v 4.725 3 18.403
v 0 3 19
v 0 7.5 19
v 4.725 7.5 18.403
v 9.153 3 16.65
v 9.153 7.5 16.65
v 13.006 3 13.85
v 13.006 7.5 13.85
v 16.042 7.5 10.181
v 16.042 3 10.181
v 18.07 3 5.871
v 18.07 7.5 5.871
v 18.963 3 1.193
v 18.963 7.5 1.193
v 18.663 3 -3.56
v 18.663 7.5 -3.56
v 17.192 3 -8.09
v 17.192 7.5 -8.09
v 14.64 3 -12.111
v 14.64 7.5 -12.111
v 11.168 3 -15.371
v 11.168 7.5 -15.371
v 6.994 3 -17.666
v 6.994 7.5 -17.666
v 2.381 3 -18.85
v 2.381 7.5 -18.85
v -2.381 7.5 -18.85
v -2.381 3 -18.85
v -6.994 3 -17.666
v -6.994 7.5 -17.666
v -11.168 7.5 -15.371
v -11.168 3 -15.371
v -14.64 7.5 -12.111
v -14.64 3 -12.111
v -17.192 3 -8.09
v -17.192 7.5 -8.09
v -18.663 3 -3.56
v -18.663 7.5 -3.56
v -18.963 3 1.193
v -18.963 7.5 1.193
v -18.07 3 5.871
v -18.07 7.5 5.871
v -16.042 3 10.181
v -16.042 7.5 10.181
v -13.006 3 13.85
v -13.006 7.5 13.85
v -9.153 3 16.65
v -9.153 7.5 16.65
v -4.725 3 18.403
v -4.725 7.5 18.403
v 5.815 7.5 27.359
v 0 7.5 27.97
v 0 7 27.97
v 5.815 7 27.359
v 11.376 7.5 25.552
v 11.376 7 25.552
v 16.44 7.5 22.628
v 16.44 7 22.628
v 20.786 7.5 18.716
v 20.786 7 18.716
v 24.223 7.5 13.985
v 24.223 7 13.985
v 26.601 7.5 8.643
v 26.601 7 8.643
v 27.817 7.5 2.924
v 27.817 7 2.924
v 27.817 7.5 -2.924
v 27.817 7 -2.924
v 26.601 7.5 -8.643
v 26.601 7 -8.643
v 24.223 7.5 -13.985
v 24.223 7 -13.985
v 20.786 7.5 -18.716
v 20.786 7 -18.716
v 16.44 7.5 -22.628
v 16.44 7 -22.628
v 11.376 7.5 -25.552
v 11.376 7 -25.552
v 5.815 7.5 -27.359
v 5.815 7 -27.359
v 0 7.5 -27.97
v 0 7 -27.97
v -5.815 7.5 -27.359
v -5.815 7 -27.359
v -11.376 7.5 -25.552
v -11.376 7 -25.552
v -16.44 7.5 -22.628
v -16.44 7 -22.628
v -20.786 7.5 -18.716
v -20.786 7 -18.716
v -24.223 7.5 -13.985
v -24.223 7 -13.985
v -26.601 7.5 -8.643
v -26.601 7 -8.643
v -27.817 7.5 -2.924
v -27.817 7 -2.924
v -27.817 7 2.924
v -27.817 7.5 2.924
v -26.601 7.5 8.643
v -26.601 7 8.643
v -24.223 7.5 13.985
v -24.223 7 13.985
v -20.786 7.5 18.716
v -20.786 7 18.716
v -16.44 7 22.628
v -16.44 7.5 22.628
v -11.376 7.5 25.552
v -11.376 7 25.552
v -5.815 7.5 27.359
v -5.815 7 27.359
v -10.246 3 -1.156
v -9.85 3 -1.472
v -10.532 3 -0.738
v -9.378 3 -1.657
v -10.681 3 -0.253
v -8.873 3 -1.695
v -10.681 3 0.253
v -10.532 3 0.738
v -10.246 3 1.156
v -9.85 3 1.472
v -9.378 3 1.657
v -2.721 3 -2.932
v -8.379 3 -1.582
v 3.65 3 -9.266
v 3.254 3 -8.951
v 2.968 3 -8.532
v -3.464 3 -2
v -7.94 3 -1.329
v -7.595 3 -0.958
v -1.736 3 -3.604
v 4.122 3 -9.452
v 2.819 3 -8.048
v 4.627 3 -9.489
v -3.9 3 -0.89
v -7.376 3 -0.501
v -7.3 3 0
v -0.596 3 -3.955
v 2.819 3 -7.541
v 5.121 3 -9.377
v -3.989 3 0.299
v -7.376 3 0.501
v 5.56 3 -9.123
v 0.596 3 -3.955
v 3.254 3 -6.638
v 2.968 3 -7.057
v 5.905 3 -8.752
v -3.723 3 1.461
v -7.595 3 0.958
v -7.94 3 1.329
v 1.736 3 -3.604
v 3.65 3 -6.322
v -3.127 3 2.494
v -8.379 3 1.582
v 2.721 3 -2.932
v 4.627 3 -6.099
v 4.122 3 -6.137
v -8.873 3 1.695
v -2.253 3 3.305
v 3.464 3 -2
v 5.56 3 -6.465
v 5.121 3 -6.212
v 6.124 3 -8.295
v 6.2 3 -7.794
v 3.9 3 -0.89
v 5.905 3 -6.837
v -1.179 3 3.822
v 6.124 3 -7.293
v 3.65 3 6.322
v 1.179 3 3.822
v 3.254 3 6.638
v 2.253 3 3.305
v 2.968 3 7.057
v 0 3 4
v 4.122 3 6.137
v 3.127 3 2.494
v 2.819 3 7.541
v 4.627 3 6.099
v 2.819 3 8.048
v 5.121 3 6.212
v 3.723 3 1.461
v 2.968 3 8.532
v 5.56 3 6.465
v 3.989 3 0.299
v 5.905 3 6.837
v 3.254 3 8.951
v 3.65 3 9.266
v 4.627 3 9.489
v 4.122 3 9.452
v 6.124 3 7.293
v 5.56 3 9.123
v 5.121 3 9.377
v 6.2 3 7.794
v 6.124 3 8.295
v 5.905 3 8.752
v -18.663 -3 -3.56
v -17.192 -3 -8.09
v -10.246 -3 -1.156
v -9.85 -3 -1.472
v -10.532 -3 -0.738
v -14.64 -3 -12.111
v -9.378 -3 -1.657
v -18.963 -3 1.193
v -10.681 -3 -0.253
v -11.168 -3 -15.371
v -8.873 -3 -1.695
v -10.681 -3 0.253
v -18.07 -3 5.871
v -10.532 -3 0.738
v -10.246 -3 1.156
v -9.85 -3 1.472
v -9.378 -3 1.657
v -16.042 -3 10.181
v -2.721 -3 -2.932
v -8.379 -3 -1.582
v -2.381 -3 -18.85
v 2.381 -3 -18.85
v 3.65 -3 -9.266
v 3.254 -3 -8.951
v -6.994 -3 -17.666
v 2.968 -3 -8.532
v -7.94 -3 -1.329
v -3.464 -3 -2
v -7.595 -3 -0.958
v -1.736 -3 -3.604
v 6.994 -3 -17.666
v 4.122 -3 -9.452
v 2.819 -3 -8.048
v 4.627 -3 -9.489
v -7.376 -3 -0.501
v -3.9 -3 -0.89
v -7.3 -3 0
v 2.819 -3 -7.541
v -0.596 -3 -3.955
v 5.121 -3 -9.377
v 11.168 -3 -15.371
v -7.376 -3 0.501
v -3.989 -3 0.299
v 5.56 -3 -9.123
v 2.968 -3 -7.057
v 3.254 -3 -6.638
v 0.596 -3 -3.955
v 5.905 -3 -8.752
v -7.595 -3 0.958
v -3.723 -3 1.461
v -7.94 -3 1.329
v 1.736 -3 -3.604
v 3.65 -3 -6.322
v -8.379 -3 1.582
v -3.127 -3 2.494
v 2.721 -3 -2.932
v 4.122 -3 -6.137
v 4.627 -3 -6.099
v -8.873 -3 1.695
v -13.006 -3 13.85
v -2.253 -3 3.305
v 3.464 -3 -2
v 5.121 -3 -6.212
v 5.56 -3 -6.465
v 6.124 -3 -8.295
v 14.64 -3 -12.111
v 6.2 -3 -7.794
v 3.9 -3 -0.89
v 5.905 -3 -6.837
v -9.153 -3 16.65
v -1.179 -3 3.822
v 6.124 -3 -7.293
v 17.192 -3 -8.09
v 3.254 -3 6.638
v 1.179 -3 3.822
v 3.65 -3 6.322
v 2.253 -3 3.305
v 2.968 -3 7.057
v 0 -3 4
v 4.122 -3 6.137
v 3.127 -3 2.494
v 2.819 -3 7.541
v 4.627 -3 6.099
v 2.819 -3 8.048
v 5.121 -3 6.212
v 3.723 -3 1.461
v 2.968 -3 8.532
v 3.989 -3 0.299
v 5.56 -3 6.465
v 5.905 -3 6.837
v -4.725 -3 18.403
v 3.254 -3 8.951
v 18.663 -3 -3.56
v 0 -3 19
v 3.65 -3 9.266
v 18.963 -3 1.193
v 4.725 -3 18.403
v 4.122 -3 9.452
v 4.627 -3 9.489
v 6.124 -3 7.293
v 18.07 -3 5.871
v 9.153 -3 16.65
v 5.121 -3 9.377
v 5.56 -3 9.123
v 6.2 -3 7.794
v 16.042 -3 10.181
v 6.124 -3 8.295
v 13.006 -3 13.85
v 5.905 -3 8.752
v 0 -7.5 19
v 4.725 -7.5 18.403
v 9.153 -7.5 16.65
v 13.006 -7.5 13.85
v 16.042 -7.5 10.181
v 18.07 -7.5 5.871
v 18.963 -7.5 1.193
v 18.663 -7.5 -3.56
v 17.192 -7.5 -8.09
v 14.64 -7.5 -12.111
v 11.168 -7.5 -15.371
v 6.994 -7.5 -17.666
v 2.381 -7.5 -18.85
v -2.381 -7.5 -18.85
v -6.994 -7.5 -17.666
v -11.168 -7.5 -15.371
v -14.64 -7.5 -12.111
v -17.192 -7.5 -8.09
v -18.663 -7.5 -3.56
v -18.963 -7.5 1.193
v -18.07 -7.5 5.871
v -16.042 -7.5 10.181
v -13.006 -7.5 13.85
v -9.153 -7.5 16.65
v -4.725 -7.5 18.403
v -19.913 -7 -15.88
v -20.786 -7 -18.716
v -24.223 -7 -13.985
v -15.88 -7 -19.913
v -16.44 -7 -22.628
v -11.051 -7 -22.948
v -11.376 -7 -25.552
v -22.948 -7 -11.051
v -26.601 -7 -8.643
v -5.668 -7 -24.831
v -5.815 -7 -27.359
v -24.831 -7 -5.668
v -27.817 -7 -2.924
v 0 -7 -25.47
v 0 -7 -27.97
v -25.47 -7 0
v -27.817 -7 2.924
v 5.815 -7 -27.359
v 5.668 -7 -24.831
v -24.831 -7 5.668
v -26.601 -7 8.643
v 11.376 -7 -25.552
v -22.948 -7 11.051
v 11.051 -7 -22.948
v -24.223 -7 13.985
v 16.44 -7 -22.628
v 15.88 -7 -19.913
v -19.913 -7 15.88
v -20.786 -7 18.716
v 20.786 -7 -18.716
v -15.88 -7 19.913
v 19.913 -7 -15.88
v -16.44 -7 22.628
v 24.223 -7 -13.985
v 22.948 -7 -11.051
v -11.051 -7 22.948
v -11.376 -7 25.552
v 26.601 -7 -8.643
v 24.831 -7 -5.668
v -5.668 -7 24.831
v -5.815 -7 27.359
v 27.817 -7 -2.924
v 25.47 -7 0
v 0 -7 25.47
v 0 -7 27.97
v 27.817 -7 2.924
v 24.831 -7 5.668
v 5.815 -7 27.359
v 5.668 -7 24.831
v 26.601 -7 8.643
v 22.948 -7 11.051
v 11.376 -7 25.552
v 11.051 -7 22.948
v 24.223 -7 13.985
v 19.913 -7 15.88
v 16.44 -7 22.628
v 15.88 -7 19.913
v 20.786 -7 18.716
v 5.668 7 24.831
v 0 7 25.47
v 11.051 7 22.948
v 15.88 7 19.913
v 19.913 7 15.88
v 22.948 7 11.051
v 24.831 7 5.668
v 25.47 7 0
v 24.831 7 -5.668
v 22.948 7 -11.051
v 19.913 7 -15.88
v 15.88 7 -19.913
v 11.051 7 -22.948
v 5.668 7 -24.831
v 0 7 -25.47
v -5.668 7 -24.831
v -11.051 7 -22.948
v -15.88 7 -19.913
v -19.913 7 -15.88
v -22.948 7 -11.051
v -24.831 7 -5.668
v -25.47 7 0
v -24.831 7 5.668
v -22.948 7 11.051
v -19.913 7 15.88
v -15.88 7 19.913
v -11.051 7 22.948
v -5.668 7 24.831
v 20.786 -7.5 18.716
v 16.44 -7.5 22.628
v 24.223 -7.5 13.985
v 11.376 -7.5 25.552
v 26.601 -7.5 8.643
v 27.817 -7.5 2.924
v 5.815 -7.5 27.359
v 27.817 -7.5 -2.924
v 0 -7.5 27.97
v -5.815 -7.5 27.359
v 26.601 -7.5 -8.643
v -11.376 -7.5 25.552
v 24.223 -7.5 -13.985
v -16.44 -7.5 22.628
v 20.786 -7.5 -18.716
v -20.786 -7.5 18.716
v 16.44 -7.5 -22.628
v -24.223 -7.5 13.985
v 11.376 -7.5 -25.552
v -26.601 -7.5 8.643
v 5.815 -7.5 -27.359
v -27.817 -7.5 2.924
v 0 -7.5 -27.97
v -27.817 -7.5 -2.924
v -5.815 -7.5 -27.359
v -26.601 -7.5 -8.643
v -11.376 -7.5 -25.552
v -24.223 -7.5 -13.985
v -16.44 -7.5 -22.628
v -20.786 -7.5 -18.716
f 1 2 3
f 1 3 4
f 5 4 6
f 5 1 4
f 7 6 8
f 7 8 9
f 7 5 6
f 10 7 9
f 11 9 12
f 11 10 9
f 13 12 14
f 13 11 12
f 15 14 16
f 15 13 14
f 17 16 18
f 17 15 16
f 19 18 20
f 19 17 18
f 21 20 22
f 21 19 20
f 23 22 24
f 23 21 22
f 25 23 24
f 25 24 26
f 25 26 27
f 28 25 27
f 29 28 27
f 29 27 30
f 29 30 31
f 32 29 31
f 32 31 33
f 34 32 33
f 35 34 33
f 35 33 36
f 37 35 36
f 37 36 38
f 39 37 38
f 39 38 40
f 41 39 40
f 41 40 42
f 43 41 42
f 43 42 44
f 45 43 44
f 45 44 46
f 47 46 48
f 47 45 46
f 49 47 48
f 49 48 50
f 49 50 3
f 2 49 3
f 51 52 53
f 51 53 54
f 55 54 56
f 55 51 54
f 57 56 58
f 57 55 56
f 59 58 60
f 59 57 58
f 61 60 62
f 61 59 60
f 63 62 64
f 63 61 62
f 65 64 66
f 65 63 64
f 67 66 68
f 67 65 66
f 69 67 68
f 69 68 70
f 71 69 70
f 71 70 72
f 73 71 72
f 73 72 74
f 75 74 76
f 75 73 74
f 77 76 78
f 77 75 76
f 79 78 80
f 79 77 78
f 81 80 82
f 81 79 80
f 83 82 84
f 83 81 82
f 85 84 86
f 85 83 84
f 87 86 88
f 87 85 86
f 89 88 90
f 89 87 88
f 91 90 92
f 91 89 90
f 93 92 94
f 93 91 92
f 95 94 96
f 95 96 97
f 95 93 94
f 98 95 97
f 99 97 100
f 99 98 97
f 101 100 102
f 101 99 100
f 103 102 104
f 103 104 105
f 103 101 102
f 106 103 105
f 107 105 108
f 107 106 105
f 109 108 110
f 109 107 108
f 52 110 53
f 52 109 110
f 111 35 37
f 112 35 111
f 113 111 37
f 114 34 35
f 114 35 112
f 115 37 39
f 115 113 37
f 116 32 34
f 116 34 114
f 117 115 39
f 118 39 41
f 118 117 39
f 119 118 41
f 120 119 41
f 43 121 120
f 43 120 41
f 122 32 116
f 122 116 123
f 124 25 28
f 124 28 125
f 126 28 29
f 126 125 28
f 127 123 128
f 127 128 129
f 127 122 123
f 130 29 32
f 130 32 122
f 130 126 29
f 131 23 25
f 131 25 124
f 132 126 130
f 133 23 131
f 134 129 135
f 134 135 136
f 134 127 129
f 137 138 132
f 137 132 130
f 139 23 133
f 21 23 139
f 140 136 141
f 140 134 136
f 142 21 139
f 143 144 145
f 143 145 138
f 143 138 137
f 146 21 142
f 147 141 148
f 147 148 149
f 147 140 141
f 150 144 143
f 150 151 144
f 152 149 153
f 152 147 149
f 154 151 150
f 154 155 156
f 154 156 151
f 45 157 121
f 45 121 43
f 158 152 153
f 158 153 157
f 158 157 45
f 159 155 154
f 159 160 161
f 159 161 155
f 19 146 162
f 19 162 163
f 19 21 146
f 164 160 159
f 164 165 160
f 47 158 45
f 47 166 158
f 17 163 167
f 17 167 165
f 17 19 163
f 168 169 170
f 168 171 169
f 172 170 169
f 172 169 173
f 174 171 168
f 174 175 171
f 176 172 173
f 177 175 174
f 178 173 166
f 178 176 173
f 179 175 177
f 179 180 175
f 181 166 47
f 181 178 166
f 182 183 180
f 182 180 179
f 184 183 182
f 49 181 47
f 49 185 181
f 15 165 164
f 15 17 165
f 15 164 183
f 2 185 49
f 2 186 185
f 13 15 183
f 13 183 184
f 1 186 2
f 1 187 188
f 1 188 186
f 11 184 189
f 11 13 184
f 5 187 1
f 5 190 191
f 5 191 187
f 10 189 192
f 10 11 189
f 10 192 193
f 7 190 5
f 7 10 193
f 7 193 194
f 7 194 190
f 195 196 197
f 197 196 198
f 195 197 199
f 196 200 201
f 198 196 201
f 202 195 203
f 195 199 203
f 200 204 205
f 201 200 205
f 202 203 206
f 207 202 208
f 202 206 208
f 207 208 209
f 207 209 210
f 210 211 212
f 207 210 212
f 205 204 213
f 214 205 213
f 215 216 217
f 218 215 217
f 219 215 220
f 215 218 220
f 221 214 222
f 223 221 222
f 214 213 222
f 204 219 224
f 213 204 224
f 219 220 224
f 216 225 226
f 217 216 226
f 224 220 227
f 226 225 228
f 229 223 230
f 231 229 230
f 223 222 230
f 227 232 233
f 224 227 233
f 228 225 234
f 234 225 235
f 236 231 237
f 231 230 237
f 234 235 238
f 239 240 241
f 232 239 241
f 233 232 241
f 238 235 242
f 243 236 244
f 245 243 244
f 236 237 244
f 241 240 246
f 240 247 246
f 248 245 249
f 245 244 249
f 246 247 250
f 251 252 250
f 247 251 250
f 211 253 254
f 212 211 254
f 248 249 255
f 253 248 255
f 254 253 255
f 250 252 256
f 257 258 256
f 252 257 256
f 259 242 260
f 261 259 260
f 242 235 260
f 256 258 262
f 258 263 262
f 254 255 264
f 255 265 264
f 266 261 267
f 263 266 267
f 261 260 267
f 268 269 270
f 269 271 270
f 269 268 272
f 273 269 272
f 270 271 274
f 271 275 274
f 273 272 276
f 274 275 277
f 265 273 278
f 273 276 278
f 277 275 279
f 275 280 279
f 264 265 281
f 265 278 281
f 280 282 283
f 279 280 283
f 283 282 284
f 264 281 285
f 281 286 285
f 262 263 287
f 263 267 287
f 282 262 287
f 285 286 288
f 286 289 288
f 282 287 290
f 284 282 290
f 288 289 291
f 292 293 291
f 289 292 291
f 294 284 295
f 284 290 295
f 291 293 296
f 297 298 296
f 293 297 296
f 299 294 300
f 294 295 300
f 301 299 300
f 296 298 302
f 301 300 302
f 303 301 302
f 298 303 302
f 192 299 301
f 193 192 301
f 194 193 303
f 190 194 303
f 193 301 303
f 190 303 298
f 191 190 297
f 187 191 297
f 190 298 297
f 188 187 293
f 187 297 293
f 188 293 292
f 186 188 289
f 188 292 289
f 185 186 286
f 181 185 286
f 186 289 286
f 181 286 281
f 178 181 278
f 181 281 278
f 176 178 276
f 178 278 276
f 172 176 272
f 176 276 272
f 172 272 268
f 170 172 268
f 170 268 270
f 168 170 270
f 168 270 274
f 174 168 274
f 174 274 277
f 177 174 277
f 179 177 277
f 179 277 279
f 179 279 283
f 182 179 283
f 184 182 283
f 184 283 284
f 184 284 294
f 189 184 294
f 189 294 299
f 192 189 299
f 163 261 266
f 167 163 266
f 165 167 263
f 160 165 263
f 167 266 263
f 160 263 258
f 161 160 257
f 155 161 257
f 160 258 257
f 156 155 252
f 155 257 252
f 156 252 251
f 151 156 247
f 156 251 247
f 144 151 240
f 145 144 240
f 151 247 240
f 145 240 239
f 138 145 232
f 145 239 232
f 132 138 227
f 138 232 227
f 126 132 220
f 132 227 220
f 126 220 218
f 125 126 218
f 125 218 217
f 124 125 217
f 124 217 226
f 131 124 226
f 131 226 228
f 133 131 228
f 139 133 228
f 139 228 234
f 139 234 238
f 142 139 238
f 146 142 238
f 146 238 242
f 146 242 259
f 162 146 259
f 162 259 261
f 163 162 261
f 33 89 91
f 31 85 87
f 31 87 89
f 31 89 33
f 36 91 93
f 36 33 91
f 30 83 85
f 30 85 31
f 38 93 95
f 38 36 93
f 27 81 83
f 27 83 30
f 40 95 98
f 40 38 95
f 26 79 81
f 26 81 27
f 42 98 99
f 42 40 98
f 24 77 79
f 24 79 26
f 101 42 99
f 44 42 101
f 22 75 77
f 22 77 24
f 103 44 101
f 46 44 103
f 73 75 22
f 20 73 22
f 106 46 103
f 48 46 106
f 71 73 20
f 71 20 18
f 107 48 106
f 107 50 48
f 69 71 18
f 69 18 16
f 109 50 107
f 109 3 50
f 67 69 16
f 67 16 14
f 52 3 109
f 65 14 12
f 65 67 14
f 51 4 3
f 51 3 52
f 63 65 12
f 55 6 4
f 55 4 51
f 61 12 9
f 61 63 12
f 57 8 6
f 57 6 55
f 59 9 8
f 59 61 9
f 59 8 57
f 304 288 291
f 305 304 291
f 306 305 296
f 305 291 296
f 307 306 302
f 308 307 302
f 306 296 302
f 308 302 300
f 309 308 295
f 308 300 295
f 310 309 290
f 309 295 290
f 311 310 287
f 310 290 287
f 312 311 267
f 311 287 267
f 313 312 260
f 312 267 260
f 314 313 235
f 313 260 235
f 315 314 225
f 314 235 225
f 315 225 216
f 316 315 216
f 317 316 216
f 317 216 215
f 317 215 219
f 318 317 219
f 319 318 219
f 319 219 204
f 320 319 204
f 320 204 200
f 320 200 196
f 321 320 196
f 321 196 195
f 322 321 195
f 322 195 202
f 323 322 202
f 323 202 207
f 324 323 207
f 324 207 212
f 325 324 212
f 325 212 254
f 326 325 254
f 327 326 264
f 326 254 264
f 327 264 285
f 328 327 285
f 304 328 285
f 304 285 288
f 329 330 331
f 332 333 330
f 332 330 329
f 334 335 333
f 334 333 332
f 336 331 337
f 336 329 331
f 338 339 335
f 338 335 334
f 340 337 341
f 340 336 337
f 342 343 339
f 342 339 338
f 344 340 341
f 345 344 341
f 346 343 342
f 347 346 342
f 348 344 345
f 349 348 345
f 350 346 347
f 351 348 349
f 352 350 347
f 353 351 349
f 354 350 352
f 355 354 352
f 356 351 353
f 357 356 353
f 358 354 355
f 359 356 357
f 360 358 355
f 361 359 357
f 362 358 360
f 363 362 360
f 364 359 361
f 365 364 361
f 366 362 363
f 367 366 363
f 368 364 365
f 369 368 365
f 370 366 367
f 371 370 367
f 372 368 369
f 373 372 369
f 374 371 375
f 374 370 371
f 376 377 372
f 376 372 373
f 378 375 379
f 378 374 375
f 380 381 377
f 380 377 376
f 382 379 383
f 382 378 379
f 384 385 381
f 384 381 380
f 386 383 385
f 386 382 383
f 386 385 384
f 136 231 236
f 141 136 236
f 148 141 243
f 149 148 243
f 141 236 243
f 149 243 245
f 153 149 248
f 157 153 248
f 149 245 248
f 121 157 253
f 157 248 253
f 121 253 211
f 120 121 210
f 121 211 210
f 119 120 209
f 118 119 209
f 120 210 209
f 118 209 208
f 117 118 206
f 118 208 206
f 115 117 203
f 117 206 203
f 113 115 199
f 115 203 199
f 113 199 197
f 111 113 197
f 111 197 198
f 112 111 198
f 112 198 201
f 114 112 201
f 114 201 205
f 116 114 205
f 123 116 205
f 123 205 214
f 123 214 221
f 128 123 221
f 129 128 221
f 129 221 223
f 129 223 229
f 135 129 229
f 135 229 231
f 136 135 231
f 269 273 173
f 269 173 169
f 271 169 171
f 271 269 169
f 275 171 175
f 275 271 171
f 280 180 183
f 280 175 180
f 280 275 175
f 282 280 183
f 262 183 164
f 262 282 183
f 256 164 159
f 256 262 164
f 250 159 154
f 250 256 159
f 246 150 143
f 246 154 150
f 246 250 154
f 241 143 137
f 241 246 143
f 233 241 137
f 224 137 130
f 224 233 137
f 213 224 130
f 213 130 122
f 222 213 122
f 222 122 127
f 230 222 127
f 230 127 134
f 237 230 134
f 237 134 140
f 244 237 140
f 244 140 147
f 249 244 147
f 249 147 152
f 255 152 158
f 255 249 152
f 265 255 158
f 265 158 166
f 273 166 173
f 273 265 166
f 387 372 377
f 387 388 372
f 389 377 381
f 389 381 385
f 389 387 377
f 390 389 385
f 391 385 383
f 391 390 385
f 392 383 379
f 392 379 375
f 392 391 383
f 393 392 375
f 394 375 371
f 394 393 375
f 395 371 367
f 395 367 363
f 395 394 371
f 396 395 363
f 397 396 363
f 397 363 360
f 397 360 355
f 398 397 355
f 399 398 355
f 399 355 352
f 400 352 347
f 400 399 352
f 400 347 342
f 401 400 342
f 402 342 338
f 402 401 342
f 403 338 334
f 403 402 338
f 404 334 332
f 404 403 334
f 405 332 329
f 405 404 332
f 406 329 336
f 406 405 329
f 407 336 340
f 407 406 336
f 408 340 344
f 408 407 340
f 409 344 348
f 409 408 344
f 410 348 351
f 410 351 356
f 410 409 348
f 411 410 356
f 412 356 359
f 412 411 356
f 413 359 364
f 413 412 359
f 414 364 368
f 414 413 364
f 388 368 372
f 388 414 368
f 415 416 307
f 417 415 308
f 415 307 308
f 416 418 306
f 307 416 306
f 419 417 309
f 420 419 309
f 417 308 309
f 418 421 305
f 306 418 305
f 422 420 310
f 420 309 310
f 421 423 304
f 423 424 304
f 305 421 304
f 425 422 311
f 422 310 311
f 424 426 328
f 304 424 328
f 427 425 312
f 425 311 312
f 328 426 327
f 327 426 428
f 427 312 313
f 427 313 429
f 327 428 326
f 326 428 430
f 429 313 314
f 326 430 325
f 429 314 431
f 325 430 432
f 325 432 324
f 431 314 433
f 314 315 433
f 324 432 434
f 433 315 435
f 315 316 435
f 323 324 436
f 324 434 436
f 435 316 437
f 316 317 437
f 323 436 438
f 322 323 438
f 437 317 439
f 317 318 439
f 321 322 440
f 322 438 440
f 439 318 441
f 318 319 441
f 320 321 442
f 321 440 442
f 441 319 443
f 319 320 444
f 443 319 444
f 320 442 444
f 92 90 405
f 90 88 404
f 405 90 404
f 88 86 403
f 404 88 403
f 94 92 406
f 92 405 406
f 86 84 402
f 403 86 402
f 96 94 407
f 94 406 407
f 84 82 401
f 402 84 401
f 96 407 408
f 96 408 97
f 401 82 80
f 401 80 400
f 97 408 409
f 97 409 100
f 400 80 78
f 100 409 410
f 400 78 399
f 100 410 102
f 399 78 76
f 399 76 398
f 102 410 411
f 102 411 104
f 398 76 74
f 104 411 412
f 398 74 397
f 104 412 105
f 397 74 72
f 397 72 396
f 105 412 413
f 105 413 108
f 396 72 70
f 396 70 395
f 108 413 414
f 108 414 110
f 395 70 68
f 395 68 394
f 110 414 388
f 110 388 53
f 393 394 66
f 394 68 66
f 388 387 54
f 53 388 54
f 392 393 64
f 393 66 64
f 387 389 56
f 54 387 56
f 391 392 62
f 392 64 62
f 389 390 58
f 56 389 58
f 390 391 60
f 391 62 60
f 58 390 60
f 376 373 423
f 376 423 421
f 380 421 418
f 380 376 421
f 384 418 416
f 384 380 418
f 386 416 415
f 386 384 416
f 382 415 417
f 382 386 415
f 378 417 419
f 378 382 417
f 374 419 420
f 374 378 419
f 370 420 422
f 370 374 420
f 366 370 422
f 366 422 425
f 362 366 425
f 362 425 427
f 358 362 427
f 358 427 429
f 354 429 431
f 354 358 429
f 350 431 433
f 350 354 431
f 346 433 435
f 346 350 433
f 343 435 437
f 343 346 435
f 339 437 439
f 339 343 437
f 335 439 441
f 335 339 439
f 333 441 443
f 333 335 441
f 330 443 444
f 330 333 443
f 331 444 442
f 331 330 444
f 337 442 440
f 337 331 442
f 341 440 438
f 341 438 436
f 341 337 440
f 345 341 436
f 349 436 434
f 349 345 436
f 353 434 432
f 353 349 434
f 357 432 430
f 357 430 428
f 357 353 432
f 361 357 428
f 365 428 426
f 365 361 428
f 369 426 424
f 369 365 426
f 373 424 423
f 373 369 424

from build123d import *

# Parameters (mm, degrees)
CROQUIS1_R                   = 25.47
SALIENTE_EXTRUIR1_DEPTH      = 7.5
CROQUIS2_R                   = 27.97
SALIENTE_EXTRUIR2_DEPTH      = 0.5
SALIENTE_EXTRUIR3_START      = -14.5
CROQUIS2_2_R                 = 27.97
SALIENTE_EXTRUIR3_DEPTH      = 0.5
CROQUIS3_R                   = 19
SALIENTE_EXTRUIR4_DEPTH      = 21
CORTAR_EXTRUIR1_DEPTH        = 45.552124528
CORTAR_EXTRUIR1_DEPTH_BACK   = 45.552124528
CROQUIS4_R                   = 4
CORTAR_EXTRUIR2_START        = -10.5
CROQUIS5_R                   = 19
CORTAR_EXTRUIR2_DEPTH        = 10.5
TALADRO_DE_MARGEN_PARA_M31_D = 3.4


with BuildPart() as part:
    # Croquis1 → Saliente-Extruir1 (new, symmetric)
    with BuildSketch(Plane(origin=(0, 0, 0), x_dir=(-1, 0, 0), z_dir=(0, 1, 0))):
        with Locations(Location((0, 0, 0), (0, 0, 90))):
            Circle(CROQUIS1_R)
    extrude(amount=SALIENTE_EXTRUIR1_DEPTH, both=True)

    # Croquis2 → Saliente-Extruir2 (add)
    with BuildSketch(Plane(origin=(0, 7.5, 0), x_dir=(-1, 0, 0), z_dir=(0, 1, 0))):
        with Locations(Location((0, 0, 0), (0, 0, 90))):
            Circle(CROQUIS2_R)
    extrude(amount=-SALIENTE_EXTRUIR2_DEPTH)

    # Croquis2<2> → Saliente-Extruir3 (add)
    with BuildSketch(Plane(origin=(0, 7.5, 0), x_dir=(-1, 0, 0), z_dir=(0, 1, 0)).offset(SALIENTE_EXTRUIR3_START)):
        with Locations(Location((0, 0, 0), (0, 0, 90))):
            Circle(CROQUIS2_2_R)
    extrude(amount=-SALIENTE_EXTRUIR3_DEPTH)

    # Croquis3 → Saliente-Extruir4 (add)
    with BuildSketch(Plane(origin=(0, -7.5, 0), x_dir=(-1, 0, 0), z_dir=(0, 1, 0))):
        with Locations(Location((0, 0, 0), (0, 0, 270))):
            Circle(CROQUIS3_R)
    extrude(amount=SALIENTE_EXTRUIR4_DEPTH)

    # Croquis4 → Cortar-Extruir1 (cut, two sides: drawn at the far end of the back side and taken through both)
    with BuildSketch(Plane(origin=(0, -7, 0), x_dir=(-1, 0, 0), z_dir=(0, 1, 0)).offset(-CORTAR_EXTRUIR1_DEPTH_BACK)):
        with Locations(Location((0, 0, 0), (0, 0, 90))):
            Circle(CROQUIS4_R)
    extrude(amount=CORTAR_EXTRUIR1_DEPTH + CORTAR_EXTRUIR1_DEPTH_BACK, mode=Mode.SUBTRACT)

    # Croquis5 → Cortar-Extruir2 (cut)
    with BuildSketch(Plane(origin=(0, 13.5, 0), x_dir=(-1, 0, 0), z_dir=(0, 1, 0)).offset(CORTAR_EXTRUIR2_START)):
        with Locations(Location((0, 0, 0), (0, 0, 90))):
            Circle(CROQUIS5_R)
    cortar_extruir2 = extrude(amount=CORTAR_EXTRUIR2_DEPTH, mode=Mode.SUBTRACT)

    # Simetría1: Cortar-Extruir2 across plane
    add(cortar_extruir2.mirror(Plane.ZX), mode=Mode.SUBTRACT)

    # Taladro de margen para M31 (through all)
    with Locations(Plane(origin=(0, 7.5, 0), x_dir=(-1, 0, 0), z_dir=(0, 1, 0))):
        with Locations((0, 0), (9, 0), (-4.5, -7.794228634), (-4.5, 7.794228634)):
            Hole(TALADRO_DE_MARGEN_PARA_M31_D / 2)


solid = part.part
